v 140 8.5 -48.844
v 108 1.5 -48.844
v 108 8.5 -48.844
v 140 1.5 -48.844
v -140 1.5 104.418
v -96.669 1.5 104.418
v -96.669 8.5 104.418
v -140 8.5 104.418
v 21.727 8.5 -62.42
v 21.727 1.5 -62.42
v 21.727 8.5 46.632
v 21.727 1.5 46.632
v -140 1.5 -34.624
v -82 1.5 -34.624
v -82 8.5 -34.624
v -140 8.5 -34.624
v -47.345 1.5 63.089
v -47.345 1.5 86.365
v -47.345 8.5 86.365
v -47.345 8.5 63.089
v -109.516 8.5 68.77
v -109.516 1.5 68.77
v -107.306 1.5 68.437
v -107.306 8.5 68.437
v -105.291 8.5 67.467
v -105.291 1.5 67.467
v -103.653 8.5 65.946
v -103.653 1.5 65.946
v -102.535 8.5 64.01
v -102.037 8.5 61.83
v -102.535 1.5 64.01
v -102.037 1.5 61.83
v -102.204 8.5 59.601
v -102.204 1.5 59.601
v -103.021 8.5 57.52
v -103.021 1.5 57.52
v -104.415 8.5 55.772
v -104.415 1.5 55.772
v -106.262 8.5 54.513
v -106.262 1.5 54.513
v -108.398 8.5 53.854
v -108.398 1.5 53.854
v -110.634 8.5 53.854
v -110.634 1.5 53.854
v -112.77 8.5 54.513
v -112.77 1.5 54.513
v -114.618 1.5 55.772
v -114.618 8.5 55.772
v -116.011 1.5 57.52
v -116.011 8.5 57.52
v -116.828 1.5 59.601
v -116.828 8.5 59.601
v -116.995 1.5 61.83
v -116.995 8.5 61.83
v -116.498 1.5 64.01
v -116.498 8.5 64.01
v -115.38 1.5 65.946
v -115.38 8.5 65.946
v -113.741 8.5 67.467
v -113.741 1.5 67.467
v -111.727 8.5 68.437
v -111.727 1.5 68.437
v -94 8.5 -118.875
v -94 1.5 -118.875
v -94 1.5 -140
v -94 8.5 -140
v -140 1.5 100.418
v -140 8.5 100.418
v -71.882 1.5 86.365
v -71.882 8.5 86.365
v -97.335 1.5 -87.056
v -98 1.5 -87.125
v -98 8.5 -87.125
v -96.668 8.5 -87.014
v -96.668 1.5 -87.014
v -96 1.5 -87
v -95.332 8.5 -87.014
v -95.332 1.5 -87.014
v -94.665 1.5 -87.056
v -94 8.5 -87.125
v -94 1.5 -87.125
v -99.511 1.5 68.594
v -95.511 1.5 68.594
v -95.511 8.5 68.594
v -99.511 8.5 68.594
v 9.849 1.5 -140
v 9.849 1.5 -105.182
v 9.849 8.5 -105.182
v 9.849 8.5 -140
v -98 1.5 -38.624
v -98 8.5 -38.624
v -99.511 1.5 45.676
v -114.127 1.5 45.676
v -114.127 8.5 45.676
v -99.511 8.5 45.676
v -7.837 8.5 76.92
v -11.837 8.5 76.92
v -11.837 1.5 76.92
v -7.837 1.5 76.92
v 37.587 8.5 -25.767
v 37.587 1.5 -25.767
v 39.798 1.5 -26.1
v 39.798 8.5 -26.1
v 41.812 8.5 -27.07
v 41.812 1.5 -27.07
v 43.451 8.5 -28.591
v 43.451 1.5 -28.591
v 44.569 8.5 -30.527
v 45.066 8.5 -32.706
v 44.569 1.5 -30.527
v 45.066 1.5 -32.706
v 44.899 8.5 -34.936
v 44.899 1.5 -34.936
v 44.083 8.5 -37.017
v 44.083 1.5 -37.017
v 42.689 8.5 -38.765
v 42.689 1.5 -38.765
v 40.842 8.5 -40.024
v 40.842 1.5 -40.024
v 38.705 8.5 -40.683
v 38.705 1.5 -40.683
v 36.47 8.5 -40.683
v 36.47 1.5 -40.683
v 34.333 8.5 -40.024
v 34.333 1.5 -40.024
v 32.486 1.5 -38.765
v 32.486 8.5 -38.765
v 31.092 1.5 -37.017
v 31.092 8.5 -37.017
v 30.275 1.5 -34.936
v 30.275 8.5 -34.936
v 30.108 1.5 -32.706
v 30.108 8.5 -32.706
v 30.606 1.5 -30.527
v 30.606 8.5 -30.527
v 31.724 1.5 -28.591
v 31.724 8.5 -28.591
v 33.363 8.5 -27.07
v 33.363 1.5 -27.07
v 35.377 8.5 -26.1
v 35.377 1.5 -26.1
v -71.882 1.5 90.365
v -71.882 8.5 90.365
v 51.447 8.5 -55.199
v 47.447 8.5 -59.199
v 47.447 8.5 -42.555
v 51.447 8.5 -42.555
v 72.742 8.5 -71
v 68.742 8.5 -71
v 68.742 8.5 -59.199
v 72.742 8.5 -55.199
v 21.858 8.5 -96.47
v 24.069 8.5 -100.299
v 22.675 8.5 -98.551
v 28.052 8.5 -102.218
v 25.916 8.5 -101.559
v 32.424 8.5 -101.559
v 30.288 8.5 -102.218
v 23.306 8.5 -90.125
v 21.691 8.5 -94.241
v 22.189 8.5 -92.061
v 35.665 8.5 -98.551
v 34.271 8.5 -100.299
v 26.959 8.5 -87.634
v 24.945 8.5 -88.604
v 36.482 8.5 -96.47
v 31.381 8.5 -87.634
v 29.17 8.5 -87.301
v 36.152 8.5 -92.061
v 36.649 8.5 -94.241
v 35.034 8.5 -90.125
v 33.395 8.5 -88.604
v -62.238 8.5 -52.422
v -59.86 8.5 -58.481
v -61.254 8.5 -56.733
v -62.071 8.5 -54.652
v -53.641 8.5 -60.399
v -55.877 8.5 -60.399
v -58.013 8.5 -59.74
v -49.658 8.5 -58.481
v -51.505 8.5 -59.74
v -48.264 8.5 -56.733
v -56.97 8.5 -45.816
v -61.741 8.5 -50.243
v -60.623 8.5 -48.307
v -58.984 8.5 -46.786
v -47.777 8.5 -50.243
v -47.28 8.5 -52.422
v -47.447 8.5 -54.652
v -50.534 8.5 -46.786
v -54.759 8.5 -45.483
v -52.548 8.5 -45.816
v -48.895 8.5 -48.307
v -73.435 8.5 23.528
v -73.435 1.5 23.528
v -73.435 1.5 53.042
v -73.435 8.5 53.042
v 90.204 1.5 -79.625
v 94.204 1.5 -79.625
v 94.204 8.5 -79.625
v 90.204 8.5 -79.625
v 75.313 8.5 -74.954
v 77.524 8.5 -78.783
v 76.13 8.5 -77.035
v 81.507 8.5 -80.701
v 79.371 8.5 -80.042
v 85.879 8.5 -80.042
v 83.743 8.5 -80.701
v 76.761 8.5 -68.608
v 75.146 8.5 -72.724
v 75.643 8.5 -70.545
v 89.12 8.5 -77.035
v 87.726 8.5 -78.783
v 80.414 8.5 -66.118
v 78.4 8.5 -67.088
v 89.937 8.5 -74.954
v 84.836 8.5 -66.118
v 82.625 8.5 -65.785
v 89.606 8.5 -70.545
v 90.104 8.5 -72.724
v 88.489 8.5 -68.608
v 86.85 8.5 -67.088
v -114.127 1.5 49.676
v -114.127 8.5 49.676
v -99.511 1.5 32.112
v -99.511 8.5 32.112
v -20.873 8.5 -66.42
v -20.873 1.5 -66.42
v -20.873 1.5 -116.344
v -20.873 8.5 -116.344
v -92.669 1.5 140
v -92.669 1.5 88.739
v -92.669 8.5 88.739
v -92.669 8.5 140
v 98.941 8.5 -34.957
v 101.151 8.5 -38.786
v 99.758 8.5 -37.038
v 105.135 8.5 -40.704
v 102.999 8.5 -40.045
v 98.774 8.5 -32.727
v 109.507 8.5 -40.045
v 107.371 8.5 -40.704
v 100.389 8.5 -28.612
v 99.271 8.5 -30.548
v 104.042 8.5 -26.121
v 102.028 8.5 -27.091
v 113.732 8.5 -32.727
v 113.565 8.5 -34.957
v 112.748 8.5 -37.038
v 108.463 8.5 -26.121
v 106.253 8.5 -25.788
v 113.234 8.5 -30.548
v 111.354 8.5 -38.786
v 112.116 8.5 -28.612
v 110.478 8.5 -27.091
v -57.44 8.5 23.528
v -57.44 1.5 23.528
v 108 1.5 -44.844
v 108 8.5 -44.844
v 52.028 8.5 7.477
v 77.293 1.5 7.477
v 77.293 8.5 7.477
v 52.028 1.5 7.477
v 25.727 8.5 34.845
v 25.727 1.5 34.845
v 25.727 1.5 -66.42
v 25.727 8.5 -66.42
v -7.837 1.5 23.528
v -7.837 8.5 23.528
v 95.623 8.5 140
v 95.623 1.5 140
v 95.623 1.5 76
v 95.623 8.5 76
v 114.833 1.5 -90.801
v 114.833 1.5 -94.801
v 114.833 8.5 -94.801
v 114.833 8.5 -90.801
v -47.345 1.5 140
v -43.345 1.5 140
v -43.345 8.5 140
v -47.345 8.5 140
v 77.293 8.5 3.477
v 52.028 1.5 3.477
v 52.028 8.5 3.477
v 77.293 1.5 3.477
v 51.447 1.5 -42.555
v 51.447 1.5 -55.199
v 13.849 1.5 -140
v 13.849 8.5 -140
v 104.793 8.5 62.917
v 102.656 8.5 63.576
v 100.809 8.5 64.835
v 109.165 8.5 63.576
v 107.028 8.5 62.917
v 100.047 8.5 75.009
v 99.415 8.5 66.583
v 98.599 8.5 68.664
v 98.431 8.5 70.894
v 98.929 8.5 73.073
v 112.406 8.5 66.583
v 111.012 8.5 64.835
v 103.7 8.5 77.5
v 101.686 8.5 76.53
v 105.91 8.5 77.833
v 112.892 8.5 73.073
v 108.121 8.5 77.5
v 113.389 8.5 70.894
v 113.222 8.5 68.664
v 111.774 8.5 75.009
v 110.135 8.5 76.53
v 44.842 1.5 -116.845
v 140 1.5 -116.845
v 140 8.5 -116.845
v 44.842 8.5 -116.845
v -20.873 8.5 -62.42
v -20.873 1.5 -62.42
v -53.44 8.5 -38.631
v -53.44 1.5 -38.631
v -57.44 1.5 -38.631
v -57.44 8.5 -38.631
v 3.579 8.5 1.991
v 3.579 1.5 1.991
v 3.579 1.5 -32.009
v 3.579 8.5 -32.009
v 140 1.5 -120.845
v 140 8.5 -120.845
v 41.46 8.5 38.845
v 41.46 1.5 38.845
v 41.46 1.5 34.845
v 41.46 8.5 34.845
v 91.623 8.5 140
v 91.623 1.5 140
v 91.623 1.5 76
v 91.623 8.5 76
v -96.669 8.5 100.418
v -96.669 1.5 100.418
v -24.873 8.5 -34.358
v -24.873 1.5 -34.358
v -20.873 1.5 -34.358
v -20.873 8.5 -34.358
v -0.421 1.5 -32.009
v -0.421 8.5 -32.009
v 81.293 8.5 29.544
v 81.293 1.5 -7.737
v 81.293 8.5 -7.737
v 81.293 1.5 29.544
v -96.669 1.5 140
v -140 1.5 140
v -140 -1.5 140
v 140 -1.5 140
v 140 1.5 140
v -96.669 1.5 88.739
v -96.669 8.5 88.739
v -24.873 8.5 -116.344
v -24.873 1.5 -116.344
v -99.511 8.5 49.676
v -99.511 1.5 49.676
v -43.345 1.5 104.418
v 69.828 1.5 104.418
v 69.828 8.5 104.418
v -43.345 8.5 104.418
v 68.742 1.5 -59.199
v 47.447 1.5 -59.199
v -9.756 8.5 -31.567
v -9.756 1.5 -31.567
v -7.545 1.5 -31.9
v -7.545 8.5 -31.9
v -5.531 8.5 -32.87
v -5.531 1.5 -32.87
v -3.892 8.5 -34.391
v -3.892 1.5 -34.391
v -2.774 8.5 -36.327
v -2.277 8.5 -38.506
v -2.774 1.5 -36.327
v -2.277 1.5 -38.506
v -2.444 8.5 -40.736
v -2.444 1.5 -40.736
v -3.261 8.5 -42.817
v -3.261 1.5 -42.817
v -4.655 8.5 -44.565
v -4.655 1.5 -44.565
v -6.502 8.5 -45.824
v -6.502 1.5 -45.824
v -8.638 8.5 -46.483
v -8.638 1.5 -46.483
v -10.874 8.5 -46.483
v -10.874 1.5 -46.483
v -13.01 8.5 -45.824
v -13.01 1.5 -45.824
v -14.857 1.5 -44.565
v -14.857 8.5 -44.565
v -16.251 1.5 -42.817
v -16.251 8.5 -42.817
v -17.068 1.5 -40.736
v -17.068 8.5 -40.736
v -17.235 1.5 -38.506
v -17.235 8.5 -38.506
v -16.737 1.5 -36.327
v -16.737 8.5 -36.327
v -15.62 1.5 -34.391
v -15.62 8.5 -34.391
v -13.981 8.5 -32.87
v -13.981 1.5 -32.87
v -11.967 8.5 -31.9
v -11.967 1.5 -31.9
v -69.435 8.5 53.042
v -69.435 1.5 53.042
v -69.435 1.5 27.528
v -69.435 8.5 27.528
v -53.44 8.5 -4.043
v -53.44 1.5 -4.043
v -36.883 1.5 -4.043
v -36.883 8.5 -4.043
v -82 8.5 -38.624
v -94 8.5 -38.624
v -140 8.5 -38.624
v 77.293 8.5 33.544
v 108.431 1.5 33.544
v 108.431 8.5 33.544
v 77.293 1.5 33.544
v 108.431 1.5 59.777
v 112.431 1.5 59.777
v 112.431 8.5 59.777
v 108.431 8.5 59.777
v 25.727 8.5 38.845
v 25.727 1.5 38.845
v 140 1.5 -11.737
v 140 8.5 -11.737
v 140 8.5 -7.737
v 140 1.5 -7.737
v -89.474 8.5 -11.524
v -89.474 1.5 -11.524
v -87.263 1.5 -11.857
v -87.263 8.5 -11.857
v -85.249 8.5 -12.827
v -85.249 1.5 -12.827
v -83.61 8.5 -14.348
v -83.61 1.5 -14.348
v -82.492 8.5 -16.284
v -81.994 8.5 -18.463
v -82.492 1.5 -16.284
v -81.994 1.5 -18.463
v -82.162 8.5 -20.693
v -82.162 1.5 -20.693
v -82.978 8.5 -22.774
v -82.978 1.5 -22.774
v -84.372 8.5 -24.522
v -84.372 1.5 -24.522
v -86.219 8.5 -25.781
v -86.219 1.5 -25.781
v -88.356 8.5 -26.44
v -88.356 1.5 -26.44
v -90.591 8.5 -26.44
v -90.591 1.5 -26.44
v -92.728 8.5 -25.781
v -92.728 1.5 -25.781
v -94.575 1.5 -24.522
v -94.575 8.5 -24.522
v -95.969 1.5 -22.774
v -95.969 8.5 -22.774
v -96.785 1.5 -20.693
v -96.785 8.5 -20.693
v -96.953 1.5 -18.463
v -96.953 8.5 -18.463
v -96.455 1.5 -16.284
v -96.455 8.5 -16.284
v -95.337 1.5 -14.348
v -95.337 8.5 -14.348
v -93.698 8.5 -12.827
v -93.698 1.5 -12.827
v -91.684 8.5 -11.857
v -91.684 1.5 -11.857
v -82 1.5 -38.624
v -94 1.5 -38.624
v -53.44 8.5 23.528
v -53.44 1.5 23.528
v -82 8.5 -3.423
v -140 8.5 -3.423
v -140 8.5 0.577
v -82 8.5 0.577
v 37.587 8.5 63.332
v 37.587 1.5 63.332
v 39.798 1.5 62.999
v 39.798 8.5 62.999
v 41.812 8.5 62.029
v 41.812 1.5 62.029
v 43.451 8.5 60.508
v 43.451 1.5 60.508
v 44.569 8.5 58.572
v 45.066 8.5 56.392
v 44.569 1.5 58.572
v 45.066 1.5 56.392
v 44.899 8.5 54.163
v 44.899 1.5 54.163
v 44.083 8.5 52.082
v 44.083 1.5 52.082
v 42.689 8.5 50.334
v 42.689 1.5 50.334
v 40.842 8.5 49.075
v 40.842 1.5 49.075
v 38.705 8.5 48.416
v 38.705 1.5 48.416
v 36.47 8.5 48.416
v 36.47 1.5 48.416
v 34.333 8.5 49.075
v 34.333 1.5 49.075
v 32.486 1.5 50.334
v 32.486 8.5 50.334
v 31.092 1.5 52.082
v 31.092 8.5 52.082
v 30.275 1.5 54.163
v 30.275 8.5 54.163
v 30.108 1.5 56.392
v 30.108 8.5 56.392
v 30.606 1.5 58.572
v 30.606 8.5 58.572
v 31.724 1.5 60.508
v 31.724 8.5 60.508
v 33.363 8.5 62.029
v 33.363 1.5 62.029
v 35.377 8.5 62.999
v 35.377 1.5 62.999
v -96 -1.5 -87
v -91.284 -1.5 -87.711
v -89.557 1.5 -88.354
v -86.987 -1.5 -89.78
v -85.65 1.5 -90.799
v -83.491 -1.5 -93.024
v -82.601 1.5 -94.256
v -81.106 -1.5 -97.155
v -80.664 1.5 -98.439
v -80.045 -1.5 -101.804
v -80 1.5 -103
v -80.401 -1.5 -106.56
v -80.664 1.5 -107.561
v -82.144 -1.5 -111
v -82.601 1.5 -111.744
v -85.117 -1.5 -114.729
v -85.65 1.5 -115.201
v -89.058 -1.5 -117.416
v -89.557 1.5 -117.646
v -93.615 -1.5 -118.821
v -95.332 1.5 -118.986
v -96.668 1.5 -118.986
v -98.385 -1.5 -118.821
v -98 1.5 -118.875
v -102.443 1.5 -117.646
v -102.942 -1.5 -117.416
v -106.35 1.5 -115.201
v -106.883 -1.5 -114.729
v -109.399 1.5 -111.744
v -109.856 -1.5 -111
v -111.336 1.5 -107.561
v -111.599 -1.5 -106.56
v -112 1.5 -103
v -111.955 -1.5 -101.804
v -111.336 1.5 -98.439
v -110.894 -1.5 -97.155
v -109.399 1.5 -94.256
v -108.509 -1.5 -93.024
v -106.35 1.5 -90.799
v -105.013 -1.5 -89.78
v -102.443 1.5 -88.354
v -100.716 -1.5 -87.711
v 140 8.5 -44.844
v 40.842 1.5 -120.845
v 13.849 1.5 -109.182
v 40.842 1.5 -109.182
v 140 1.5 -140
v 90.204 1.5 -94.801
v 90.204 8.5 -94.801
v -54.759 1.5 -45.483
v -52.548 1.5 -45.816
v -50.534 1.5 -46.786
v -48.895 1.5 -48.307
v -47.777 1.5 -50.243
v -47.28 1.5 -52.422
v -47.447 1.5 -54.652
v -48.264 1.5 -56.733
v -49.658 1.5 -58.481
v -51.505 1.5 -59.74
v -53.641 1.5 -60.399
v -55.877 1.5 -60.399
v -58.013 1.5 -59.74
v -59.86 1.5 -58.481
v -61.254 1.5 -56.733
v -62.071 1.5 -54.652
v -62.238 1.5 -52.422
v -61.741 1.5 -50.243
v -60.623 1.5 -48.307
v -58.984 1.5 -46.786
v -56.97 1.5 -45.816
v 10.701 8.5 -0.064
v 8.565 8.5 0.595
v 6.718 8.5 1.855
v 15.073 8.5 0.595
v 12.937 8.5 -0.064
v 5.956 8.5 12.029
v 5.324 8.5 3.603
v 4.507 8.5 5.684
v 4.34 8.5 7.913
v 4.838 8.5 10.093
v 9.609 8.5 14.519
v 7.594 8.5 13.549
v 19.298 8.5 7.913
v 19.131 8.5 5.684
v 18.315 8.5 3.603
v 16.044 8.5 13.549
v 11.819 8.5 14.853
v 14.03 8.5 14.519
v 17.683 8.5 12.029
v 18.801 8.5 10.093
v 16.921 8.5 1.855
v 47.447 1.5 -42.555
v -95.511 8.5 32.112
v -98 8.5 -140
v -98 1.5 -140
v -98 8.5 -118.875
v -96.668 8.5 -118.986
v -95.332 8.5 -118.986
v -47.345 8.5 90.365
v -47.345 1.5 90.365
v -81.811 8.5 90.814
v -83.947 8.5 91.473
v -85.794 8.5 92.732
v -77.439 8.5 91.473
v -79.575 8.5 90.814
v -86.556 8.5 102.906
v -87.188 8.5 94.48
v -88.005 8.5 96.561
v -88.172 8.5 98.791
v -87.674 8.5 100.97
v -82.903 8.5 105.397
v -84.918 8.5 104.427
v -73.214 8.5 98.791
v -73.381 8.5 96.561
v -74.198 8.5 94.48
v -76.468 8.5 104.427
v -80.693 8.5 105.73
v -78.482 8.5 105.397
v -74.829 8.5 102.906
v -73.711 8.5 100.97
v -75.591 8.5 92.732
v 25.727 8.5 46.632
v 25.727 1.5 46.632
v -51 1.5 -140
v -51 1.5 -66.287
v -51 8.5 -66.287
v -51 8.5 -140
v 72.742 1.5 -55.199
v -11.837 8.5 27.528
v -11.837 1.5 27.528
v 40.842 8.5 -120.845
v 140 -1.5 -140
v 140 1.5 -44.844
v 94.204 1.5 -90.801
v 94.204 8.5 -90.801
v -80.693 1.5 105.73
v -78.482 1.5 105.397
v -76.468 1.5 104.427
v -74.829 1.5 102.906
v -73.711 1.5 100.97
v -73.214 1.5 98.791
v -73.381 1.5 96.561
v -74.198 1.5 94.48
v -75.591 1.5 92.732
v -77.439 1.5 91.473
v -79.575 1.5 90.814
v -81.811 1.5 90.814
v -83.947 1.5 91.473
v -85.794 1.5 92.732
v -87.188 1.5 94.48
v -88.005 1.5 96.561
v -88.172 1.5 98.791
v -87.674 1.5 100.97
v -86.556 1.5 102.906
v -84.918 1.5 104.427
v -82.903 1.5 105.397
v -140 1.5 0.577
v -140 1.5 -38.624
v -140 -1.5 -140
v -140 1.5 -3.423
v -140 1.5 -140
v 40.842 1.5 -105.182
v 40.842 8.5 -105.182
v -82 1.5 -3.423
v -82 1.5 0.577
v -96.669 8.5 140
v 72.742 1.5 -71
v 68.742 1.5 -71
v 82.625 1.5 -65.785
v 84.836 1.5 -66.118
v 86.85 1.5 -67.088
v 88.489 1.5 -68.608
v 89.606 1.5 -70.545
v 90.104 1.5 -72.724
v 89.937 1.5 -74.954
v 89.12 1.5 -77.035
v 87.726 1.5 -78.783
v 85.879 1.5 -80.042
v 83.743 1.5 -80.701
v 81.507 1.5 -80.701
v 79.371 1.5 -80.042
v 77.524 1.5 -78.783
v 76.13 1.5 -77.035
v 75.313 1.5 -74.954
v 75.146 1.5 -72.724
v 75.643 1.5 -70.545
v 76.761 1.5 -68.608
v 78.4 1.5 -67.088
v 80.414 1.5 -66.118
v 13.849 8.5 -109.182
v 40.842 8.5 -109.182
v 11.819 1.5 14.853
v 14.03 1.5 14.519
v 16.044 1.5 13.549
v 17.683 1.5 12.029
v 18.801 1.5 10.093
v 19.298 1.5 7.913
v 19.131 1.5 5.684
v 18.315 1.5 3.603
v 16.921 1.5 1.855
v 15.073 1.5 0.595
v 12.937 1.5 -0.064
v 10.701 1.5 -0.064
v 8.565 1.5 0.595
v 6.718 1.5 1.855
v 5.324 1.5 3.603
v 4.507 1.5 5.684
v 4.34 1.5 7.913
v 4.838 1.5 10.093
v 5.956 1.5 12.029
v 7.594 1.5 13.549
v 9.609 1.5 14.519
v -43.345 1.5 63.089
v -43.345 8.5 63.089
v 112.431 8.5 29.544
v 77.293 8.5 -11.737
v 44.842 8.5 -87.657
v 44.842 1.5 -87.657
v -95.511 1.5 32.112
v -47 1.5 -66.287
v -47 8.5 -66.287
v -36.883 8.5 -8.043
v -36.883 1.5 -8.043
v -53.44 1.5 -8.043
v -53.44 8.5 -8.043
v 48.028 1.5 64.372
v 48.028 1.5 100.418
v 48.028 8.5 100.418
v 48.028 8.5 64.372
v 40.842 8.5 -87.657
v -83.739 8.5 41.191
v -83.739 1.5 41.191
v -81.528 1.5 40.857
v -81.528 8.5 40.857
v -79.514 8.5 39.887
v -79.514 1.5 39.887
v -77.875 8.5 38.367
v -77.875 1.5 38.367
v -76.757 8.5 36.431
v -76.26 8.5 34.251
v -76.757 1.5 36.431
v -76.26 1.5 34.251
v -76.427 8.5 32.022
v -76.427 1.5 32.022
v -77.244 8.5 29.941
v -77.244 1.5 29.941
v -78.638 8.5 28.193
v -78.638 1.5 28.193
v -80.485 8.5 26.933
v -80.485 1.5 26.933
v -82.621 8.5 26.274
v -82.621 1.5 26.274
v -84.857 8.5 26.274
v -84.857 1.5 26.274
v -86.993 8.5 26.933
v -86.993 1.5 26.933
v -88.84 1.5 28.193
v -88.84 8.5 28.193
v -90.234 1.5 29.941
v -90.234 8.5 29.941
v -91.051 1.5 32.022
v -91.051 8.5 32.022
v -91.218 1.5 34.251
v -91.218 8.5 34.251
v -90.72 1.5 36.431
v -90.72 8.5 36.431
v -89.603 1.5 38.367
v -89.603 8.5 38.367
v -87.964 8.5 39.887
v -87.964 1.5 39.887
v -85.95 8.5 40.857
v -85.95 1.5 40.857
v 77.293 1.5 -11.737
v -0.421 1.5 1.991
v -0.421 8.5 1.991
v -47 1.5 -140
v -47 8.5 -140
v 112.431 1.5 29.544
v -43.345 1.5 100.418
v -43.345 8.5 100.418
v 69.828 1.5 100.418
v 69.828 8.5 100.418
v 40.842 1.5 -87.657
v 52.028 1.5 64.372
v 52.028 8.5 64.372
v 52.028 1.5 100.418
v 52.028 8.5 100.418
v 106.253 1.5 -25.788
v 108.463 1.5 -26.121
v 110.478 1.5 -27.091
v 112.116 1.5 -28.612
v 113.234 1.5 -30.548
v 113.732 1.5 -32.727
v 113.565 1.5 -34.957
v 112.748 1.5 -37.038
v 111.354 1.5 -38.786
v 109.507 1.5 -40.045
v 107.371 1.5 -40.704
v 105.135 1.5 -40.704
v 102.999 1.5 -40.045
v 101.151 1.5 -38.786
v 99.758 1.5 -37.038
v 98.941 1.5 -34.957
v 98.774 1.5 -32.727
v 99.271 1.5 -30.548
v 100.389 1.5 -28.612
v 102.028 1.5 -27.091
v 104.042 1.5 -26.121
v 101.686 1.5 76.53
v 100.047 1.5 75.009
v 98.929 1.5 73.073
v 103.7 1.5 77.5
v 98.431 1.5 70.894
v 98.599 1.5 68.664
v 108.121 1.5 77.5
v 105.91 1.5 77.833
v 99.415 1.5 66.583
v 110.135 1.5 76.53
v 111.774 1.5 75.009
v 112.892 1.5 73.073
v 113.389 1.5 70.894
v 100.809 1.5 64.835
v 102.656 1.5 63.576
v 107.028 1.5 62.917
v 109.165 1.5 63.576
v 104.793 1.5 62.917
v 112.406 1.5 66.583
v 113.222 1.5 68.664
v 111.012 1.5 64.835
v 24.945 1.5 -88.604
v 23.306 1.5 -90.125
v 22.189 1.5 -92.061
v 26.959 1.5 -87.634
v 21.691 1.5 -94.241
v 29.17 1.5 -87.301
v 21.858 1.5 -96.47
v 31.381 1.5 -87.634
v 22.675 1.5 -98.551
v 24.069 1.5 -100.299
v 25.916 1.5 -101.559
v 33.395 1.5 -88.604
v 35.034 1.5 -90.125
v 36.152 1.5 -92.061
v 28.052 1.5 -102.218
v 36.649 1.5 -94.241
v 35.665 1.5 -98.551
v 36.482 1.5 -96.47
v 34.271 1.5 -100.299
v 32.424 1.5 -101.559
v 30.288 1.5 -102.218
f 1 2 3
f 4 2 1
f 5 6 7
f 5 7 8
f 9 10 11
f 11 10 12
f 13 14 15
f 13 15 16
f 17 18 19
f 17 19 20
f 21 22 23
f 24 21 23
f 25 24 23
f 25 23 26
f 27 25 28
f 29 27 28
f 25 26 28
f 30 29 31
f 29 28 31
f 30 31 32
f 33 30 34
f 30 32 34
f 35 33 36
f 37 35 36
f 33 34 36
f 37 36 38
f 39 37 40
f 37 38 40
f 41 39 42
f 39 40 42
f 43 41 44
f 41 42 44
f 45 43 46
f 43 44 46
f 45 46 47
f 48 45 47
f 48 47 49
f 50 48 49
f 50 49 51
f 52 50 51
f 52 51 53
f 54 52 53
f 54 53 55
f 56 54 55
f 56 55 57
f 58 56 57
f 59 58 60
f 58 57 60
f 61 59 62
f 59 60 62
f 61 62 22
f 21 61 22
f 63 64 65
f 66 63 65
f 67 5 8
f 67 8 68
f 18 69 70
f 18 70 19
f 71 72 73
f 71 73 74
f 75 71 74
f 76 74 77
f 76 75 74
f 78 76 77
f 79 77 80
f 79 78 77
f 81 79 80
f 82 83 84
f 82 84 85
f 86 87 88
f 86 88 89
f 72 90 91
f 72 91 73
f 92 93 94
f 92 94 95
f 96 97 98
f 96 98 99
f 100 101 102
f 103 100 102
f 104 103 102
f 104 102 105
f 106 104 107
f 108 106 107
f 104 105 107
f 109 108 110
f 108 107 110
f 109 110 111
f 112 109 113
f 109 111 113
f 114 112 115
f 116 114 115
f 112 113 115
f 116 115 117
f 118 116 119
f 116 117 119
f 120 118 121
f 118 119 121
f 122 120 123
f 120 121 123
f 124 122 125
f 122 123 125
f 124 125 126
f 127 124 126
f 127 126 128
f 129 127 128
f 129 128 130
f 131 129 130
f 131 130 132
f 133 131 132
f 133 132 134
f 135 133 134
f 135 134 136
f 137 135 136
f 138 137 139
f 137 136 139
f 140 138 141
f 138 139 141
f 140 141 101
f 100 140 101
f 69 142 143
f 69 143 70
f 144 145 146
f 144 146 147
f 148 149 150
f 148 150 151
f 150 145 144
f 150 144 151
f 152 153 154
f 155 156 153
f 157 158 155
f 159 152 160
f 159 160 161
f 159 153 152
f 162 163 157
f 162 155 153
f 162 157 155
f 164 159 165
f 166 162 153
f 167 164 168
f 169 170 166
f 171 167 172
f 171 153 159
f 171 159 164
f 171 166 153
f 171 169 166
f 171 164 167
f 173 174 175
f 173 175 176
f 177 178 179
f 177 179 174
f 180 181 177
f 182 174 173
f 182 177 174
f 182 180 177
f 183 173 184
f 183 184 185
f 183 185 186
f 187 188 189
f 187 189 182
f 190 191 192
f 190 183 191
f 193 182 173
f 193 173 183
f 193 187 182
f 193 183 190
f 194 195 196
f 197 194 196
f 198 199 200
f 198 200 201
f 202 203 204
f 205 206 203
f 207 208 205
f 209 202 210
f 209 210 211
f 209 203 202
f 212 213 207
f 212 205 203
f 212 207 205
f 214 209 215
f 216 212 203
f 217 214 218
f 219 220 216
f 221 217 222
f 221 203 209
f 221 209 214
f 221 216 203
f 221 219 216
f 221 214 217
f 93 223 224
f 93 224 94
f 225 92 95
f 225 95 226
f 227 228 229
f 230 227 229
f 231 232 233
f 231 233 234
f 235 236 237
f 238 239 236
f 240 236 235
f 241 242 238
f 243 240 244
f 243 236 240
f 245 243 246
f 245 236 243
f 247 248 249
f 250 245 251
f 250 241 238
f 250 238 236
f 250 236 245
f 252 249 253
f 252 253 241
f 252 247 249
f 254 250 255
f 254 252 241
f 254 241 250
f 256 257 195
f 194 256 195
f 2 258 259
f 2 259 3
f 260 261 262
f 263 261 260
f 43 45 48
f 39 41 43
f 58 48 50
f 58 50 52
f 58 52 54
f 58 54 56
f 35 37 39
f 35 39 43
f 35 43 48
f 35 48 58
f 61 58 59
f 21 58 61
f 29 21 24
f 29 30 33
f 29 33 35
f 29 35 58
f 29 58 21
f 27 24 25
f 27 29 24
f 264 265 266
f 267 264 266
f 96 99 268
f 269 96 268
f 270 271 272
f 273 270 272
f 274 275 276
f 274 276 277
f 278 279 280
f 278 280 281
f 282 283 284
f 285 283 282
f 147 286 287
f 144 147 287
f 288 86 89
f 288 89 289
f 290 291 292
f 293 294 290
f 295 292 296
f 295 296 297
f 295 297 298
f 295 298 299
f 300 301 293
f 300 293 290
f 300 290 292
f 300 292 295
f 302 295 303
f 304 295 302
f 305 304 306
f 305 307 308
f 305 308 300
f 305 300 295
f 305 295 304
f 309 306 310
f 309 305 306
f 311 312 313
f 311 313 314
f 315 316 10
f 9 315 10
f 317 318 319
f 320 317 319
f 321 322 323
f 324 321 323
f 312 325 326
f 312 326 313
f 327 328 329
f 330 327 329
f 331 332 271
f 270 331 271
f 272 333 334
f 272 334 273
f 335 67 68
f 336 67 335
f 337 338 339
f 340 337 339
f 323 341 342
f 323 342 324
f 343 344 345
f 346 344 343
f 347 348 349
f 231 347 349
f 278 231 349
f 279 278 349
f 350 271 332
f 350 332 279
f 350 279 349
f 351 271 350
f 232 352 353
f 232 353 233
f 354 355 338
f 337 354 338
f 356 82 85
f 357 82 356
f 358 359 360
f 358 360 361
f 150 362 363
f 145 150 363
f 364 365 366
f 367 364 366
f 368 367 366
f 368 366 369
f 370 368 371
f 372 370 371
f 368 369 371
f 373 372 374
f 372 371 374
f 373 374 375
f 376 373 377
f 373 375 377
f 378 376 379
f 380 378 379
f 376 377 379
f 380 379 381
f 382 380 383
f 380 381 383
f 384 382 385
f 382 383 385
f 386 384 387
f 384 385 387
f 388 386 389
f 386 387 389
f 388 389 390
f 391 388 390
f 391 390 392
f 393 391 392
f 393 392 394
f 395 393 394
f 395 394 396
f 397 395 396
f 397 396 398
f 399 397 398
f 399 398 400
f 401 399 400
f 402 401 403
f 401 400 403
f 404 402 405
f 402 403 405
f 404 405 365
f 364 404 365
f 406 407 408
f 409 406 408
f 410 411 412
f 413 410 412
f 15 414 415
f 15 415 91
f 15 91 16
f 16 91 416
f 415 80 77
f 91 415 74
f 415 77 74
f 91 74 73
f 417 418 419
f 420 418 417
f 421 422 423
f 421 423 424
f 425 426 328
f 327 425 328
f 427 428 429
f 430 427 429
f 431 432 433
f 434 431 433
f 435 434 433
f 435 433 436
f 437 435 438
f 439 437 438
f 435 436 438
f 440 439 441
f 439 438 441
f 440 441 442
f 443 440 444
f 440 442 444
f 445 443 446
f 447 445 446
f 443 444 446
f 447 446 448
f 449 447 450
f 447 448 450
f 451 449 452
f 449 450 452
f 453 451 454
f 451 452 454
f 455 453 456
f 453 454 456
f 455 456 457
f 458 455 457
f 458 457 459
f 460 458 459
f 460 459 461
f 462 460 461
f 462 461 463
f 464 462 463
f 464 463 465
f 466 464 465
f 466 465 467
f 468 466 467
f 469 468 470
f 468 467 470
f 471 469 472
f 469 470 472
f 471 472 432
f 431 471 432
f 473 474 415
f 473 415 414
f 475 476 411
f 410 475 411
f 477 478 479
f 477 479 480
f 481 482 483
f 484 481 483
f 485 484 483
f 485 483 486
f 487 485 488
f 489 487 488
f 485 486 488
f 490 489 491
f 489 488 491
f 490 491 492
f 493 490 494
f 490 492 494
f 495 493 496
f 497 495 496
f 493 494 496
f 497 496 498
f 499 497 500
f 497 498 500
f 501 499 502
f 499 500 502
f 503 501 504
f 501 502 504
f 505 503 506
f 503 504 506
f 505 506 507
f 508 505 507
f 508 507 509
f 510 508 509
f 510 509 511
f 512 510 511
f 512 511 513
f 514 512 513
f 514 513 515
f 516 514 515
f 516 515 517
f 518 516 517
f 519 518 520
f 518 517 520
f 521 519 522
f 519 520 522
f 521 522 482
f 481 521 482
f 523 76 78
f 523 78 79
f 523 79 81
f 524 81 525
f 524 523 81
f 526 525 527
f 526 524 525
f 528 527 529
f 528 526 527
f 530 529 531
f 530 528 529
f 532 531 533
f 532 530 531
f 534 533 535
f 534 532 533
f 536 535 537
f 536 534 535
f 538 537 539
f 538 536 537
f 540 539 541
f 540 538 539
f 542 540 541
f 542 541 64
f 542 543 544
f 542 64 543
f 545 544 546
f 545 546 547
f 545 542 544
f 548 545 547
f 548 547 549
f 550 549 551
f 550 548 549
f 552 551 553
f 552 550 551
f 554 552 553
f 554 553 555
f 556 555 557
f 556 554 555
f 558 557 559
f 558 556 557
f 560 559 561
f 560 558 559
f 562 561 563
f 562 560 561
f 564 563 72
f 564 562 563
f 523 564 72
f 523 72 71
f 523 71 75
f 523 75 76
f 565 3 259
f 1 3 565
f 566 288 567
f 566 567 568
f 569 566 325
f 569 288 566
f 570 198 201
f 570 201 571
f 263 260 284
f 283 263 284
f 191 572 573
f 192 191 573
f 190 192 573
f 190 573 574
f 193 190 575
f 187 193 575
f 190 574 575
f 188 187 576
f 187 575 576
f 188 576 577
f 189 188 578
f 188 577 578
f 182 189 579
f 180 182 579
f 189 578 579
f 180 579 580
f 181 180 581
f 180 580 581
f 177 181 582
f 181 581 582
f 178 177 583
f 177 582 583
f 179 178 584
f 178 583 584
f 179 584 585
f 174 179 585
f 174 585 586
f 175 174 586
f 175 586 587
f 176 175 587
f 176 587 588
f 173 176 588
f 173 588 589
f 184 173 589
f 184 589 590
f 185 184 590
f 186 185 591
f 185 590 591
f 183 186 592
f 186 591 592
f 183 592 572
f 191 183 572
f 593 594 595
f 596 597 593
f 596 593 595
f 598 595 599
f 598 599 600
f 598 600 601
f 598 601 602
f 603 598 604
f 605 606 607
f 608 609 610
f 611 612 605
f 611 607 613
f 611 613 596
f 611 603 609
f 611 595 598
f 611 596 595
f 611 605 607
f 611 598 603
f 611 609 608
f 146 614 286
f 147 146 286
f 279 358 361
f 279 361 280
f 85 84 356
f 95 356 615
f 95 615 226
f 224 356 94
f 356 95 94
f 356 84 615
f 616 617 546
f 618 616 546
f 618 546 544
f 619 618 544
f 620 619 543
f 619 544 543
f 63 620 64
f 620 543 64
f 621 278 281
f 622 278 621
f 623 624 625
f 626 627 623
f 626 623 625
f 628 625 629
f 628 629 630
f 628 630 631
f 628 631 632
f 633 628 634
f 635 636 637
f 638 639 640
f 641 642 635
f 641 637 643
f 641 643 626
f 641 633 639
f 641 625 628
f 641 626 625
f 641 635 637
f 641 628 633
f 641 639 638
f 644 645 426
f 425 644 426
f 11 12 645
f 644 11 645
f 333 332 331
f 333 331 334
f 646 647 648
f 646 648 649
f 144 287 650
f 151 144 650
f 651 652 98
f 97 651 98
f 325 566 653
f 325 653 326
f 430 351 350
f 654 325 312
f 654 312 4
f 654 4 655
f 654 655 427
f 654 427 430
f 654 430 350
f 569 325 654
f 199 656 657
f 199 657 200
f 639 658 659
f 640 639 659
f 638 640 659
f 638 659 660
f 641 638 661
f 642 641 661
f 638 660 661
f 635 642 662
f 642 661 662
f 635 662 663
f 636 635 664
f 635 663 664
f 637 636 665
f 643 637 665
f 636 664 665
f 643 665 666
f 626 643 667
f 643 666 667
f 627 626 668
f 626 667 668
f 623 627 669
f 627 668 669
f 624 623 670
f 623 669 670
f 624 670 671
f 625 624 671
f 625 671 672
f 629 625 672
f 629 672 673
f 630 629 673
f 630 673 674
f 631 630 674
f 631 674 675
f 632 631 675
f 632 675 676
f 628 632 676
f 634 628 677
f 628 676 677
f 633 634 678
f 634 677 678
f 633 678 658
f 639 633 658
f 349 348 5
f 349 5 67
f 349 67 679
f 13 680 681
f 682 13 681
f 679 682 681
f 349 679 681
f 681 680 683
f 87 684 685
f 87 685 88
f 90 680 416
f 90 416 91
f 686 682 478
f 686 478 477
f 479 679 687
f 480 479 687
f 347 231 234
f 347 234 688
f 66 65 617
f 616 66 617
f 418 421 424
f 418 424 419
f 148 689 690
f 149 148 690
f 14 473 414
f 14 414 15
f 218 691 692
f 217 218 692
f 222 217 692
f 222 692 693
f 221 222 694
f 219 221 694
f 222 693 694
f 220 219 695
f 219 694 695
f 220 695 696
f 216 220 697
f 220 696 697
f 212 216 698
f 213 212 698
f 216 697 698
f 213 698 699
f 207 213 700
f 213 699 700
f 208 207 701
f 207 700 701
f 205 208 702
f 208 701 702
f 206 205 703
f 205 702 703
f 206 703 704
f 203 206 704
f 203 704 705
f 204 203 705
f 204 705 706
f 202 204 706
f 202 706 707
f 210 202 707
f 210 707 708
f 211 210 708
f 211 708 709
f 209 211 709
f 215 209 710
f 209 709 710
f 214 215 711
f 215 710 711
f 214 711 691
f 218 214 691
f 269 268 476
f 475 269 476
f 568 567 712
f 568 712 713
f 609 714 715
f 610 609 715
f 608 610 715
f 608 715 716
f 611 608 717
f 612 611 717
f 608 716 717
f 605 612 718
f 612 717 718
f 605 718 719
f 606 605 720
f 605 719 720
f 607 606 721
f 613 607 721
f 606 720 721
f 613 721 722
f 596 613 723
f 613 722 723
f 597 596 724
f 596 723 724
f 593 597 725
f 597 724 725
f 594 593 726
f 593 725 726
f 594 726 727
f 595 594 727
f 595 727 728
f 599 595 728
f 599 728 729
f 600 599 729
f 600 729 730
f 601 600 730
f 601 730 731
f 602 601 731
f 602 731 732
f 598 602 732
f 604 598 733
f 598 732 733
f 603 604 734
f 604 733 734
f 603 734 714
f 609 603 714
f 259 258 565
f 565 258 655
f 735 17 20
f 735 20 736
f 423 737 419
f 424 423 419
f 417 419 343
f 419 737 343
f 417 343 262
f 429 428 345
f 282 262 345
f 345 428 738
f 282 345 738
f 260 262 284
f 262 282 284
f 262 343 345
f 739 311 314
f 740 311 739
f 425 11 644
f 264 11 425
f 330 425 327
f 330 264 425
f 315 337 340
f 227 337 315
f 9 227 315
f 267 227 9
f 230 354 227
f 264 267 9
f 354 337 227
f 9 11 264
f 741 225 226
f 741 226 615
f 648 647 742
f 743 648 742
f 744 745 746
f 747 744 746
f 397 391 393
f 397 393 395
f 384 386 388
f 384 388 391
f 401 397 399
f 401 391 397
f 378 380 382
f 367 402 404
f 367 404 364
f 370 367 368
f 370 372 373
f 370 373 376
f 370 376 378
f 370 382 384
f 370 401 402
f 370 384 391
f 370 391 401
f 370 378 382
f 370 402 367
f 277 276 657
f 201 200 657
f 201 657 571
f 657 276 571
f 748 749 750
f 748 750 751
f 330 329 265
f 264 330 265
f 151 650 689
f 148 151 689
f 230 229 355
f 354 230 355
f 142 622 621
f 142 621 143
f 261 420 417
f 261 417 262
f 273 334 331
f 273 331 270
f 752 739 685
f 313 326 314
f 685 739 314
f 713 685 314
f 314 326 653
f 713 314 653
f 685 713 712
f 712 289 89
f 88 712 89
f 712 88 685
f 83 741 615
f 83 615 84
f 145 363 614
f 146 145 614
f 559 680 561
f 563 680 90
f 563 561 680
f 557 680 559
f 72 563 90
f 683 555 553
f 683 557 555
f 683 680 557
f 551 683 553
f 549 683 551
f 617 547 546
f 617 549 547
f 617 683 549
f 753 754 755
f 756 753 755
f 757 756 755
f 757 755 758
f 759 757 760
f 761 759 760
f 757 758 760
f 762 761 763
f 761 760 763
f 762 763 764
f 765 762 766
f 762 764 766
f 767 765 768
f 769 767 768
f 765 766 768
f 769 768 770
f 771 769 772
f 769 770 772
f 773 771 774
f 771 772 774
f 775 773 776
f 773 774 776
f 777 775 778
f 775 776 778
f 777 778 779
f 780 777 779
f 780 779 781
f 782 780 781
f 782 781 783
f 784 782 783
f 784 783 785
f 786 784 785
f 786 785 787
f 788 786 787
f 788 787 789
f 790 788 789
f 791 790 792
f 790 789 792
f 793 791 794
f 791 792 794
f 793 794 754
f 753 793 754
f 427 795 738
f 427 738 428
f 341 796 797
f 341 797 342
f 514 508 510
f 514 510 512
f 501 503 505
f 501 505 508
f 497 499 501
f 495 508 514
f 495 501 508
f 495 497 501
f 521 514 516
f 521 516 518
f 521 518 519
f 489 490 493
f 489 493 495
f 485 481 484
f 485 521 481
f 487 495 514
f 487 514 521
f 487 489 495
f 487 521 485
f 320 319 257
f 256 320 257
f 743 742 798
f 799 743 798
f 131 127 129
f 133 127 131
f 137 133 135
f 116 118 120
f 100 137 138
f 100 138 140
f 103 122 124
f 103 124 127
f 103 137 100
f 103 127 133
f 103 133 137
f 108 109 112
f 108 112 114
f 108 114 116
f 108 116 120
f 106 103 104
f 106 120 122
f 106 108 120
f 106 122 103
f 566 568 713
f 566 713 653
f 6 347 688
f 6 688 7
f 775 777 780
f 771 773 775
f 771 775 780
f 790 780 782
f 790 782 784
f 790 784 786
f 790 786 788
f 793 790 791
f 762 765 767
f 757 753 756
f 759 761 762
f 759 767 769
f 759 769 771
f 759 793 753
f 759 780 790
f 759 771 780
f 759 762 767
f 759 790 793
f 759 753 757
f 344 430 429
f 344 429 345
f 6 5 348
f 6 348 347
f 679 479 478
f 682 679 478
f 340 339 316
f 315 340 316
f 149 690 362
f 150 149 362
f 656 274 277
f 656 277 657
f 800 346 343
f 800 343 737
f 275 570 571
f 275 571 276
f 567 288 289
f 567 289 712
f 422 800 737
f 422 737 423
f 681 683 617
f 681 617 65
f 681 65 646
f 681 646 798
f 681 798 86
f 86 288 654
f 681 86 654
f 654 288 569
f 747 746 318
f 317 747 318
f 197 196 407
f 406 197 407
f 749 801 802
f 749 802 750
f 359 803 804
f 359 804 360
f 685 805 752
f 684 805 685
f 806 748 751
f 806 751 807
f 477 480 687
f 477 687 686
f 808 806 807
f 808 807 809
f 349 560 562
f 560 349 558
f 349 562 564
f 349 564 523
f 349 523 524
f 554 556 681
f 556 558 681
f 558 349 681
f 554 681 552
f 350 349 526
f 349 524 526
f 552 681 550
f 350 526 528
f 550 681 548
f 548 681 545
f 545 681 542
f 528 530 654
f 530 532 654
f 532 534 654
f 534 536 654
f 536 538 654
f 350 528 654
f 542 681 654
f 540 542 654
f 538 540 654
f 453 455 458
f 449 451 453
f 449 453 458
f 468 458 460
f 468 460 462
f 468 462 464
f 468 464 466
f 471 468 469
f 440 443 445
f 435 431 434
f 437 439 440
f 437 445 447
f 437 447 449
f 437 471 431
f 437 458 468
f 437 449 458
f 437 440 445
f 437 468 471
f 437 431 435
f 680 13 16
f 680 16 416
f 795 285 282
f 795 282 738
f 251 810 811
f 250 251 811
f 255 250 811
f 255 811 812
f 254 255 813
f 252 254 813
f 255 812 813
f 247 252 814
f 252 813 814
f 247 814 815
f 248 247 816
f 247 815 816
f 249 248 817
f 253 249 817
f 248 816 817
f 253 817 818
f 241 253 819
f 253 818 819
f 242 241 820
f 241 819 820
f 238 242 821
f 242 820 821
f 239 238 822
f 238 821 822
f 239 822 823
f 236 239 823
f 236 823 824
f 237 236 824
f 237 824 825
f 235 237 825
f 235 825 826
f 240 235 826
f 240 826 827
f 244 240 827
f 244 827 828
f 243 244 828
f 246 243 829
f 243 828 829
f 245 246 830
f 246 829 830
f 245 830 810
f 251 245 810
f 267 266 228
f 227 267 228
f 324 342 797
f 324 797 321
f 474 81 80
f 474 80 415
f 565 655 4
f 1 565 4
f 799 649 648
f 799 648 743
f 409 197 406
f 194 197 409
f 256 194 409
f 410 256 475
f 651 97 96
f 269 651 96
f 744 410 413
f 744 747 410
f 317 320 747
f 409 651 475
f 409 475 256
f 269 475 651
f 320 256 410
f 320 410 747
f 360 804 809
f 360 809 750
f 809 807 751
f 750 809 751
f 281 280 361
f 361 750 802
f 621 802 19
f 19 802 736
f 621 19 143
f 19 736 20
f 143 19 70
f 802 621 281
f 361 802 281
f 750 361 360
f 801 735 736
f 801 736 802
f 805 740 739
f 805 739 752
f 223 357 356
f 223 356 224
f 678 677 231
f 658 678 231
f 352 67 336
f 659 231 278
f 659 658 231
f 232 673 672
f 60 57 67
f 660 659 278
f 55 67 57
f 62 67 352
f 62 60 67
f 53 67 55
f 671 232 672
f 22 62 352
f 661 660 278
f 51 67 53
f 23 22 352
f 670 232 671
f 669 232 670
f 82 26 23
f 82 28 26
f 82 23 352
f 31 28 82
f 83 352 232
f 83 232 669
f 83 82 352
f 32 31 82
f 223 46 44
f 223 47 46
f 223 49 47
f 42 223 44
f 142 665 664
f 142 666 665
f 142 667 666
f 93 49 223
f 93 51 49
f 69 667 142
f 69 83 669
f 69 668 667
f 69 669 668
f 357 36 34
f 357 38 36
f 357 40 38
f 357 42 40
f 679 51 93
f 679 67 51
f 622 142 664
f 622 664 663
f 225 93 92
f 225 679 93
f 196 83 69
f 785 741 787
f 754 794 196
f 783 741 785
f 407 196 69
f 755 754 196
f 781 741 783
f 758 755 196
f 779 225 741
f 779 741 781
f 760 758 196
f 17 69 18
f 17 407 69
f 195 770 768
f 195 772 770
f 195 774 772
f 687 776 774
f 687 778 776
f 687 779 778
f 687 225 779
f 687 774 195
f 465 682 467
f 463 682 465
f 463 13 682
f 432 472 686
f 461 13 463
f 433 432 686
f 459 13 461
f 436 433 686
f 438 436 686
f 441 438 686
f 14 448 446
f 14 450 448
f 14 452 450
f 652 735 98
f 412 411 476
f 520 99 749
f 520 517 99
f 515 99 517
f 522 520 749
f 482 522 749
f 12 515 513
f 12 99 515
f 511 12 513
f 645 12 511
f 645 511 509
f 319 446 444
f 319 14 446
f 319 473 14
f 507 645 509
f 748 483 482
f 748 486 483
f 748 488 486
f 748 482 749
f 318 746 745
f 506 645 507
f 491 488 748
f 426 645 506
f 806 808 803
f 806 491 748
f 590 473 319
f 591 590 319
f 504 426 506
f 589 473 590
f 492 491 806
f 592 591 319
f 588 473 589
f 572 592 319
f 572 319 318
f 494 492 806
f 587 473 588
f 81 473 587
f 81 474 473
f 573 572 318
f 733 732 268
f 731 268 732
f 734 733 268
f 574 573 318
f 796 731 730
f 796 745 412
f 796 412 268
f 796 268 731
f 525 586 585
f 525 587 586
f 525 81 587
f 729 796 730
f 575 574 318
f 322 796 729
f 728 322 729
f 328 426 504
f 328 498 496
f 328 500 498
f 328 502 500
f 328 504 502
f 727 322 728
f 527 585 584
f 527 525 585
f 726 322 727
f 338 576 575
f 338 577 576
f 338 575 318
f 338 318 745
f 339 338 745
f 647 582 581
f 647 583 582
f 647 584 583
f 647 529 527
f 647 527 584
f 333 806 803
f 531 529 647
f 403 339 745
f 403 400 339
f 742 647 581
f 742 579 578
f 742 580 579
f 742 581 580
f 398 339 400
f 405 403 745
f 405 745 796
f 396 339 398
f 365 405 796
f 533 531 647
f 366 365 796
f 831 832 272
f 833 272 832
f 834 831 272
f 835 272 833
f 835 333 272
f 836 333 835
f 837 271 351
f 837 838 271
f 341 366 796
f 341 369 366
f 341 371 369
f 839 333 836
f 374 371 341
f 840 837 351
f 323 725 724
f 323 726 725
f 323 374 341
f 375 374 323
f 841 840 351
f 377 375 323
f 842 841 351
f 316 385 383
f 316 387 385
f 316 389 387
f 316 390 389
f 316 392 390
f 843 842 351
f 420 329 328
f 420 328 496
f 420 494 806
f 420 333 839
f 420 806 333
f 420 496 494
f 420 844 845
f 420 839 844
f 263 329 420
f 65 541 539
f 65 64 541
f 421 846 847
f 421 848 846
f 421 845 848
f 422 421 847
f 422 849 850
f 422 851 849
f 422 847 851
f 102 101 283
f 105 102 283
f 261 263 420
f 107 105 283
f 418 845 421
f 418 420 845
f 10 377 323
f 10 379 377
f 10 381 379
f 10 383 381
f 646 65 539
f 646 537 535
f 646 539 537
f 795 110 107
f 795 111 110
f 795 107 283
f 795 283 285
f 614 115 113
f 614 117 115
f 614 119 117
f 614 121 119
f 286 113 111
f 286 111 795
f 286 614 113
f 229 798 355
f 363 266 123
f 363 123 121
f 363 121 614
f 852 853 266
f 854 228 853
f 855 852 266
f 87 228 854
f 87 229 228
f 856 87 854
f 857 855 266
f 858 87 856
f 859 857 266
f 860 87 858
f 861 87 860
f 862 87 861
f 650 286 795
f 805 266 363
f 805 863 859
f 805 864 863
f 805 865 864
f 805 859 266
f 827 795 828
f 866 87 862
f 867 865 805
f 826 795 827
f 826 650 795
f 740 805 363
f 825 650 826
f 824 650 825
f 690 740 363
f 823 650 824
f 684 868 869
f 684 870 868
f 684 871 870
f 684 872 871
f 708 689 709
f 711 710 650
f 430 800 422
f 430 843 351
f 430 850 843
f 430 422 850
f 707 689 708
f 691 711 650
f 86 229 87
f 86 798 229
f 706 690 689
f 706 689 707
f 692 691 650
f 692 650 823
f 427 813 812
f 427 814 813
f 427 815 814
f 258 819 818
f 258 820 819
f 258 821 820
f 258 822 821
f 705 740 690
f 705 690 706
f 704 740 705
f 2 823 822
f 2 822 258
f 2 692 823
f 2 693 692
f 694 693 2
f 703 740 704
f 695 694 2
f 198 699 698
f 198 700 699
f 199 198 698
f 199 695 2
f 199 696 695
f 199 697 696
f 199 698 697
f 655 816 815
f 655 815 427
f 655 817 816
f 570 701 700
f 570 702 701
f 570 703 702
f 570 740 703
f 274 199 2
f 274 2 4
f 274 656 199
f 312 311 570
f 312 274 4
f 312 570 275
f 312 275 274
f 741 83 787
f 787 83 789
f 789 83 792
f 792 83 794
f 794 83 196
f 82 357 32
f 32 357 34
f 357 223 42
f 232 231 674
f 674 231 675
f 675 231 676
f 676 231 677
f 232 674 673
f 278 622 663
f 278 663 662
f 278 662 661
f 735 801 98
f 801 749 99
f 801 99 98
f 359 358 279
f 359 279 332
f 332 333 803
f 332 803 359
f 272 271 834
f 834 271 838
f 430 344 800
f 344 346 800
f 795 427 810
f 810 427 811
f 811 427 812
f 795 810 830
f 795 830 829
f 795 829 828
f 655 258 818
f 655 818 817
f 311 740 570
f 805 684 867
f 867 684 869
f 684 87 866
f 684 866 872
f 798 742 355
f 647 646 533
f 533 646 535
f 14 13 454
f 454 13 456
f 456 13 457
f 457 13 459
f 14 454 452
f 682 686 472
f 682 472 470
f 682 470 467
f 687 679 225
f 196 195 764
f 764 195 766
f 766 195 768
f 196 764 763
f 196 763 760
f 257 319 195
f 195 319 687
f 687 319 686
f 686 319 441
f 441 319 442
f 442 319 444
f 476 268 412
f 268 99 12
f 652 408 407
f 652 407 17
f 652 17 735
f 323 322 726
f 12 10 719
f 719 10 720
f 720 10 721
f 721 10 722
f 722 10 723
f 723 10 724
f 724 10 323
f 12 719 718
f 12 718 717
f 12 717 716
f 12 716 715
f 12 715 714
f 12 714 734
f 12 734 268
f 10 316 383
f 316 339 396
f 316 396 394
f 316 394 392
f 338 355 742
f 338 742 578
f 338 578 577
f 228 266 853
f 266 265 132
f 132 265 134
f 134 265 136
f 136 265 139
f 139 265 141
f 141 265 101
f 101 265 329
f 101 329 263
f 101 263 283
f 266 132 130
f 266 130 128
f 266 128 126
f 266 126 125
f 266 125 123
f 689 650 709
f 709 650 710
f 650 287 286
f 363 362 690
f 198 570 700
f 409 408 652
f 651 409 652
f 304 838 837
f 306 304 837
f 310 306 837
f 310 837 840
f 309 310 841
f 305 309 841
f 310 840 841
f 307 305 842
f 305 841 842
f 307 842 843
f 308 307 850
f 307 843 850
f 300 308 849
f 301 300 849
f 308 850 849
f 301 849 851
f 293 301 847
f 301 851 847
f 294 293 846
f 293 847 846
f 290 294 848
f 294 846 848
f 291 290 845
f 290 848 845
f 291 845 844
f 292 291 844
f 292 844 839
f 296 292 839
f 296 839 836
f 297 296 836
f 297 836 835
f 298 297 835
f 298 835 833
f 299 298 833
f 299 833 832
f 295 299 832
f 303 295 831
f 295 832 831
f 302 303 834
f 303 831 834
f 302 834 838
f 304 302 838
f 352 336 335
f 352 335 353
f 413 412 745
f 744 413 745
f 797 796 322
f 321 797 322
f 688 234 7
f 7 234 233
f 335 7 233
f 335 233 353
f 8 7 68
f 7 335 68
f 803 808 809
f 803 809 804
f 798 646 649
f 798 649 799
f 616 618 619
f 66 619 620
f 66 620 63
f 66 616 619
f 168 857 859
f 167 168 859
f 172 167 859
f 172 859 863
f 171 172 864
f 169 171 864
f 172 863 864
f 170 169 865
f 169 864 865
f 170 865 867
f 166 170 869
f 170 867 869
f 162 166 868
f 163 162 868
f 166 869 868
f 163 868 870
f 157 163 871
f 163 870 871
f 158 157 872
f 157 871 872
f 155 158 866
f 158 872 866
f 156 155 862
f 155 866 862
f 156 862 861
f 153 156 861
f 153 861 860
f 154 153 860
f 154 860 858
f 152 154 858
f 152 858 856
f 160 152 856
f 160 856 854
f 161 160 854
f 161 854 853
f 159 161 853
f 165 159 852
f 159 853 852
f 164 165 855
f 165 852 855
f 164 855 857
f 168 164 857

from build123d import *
from build123d.topology import SkipClean

# Parameters (mm, degrees)
SKETCH1_W           = 280
SKETCH1_H           = 280
SKETCH1_R           = 16
BOSS_EXTRUDE1_DEPTH = 1.5
SKETCH2_R           = 7.5
SKETCH2_W           = 4
SKETCH2_H           = 73.713198053
SKETCH2_W_2         = 58
SKETCH2_H_2         = 4
SKETCH2_H_3         = 64
SKETCH2_W_3         = 32
SKETCH2_H_4         = 34
BOSS_EXTRUDE2_DEPTH = 7


with BuildPart() as part:
    # Sketch1 → Boss-Extrude1 (new, symmetric)
    with BuildSketch(Plane(origin=(0, 0, 0), x_dir=(1, 0, 0), z_dir=(0, 1, 0))):
        Rectangle(SKETCH1_W, SKETCH1_H)
        with Locations(Location((-96, 103, 0), (0, 0, 270))):
            Circle(SKETCH1_R, mode=Mode.SUBTRACT)
    extrude(amount=BOSS_EXTRUDE1_DEPTH, both=True)

    # Sketch2 → Boss-Extrude2 (add)
    with SkipClean():  # the faces are left unmerged after this step: merging them gives an invalid solid
        with BuildSketch(Plane(origin=(0, 1.5, 0), x_dir=(1, 0, 0), z_dir=(0, 1, 0))):
            with Locations(Location((-54.759044634, 52.982810669, 0), (0, 0, 270))):
                Circle(SKETCH2_R)
            with Locations(Location((-89.473504534, 19.023832923, 0), (0, 0, 270))):
                Circle(SKETCH2_R)
            with Locations(Location((-83.738928303, -33.690548853, 0), (0, 0, 270))):
                Circle(SKETCH2_R)
            with Locations(Location((-109.516269096, -61.269929812, 0), (0, 0, 270))):
                Circle(SKETCH2_R)
            with Locations(Location((-80.69273369, -98.230062392, 0), (0, 0, 270))):
                Circle(SKETCH2_R)
            with Locations(Location((37.587423323, -55.831973409, 0), (0, 0, 270))):
                Circle(SKETCH2_R)
            with Locations(Location((105.9104653, -70.333190482, 0), (0, 0, 270))):
                Circle(SKETCH2_R)
            with Locations(Location((11.819316554, -7.352500668, 0), (0, 0, 270))):
                Circle(SKETCH2_R)
            with Locations(Location((-9.755931913, 39.066973306, 0), (0, 0, 270))):
                Circle(SKETCH2_R)
            with Locations(Location((29.170109307, 94.80128466, 0), (0, 0, 270))):
                Circle(SKETCH2_R)
            with Locations(Location((82.624857116, 73.284632448, 0), (0, 0, 270))):
                Circle(SKETCH2_R)
            with Locations(Location((37.587423323, 33.266850719, 0), (0, 0, 270))):
                Circle(SKETCH2_R)
            with Locations(Location((106.252694304, 33.287862382, 0), (0, 0, 270))):
                Circle(SKETCH2_R)
            with Locations((-49, 103.143400974)):
                Rectangle(SKETCH2_W, SKETCH2_H)
            with BuildLine():
                Line((-94, 140), (-98, 140))
                Line((-98, 140), (-98, 118.874507866))
                ThreePointArc((-98, 118.874507866), (-96, 119), (-94, 118.874507866))
                Line((-94, 118.874507866), (-94, 140))
            make_face()
            with BuildLine():
                Line((-140, 38.624379655), (-98, 38.624379655))
                Line((-98, 38.624379655), (-98, 87.125492134))
                ThreePointArc((-98, 87.125492134), (-96, 87), (-94, 87.125492134))
                Line((-94, 87.125492134), (-94, 38.624379655))
                Line((-94, 38.624379655), (-82, 38.624379655))
                Line((-82, 38.624379655), (-82, 34.624379655))
                Line((-82, 34.624379655), (-140, 34.624379655))
                Line((-140, 34.624379655), (-140, 38.624379655))
            make_face()
            Polygon((-140, -100.418377476), (-96.668523278, -100.418377476), (-96.668523278, -88.738640334), (-92.668523278, -88.738640334), (-92.668523278, -140), (-96.668523278, -140), (-96.668523278, -104.418377476), (-140, -104.418377476), align=None)
            with Locations((-111, 1.423286191)):
                Rectangle(SKETCH2_W_2, SKETCH2_H_2)
            Polygon((-47.345115434, -140), (-47.345115434, -90.364557891), (-71.881878867, -90.364557891), (-71.881878867, -86.364557891), (-47.345115434, -86.364557891), (-47.345115434, -63.088559208), (-43.345115434, -63.088559208), (-43.345115434, -100.418377476), (48.027751829, -100.418377476), (48.027751829, -64.371939455), (52.027751829, -64.371939455), (52.027751829, -100.418377476), (69.827851451, -100.418377476), (69.827851451, -104.418377476), (-43.345115434, -104.418377476), (-43.345115434, -140), align=None)
            Polygon((140, 7.737266613), (81.293142587, 7.737266613), (81.293142587, -29.543544834), (112.431248518, -29.543544834), (112.431248518, -59.777272974), (108.431248518, -59.777272974), (108.431248518, -33.543544834), (77.293142587, -33.543544834), (77.293142587, -7.47679166), (52.027751829, -7.47679166), (52.027751829, -3.47679166), (77.293142587, -3.47679166), (77.293142587, 11.737266613), (140, 11.737266613), align=None)
            with Locations((93.622601552, -108)):
                Rectangle(SKETCH2_W, SKETCH2_H_3)
            Polygon((-99.510735812, -32.111868954), (-95.510735812, -32.111868954), (-95.510735812, -68.594238703), (-99.510735812, -68.594238703), (-99.510735812, -49.675826938), (-114.127069846, -49.675826938), (-114.127069846, -45.675826938), (-99.510735812, -45.675826938), align=None)
            with Locations((124, 46.843999527)):
                Rectangle(SKETCH2_W_3, SKETCH2_H_2)
            Polygon((-73.435195895, -53.042459291), (-69.435195895, -53.042459291), (-69.435195895, -27.528186601), (-11.837088751, -27.528186601), (-11.837088751, -76.919702569), (-7.837088751, -76.919702569), (-7.837088751, -23.528186601), (-53.440050937, -23.528186601), (-53.440050937, 4.043094912), (-36.882667743, 4.043094912), (-36.882667743, 8.043094912), (-53.440050937, 8.043094912), (-53.440050937, 38.63118777), (-57.440050937, 38.63118777), (-57.440050937, -23.528186601), (-73.435195895, -23.528186601), align=None)
            Polygon((114.833141636, 94.80128466), (114.833141636, 90.80128466), (94.203549623, 90.80128466), (94.203549623, 79.625492134), (90.203549623, 79.625492134), (90.203549623, 94.80128466), align=None)
            with Locations((1.57904958, 15.009472223)):
                Rectangle(SKETCH2_W, SKETCH2_H_4)
            Polygon((68.742119222, 71), (68.742119222, 59.19860167), (47.447056499, 59.19860167), (47.447056499, 42.554658178), (51.447056499, 42.554658178), (51.447056499, 55.19860167), (72.742119222, 55.19860167), (72.742119222, 71), align=None)
            Polygon((21.727135977, -46.6315684), (25.727135977, -46.6315684), (25.727135977, -38.844500644), (41.459511743, -38.844500644), (41.459511743, -34.844500644), (25.727135977, -34.844500644), (25.727135977, 66.420221849), (-20.87255933, 66.420221849), (-20.87255933, 116.344219933), (-24.87255933, 116.344219933), (-24.87255933, 34.358038326), (-20.87255933, 34.358038326), (-20.87255933, 62.420221849), (21.727135977, 62.420221849), align=None)
            Polygon((140, 116.845058218), (44.841725693, 116.845058218), (44.841725693, 87.65657302), (40.841725693, 87.65657302), (40.841725693, 105.182034885), (9.848778982, 105.182034885), (9.848778982, 140), (13.848778982, 140), (13.848778982, 109.182034885), (40.841725693, 109.182034885), (40.841725693, 120.845058218), (140, 120.845058218), align=None)
        extrude(amount=BOSS_EXTRUDE2_DEPTH)


solid = part.part
